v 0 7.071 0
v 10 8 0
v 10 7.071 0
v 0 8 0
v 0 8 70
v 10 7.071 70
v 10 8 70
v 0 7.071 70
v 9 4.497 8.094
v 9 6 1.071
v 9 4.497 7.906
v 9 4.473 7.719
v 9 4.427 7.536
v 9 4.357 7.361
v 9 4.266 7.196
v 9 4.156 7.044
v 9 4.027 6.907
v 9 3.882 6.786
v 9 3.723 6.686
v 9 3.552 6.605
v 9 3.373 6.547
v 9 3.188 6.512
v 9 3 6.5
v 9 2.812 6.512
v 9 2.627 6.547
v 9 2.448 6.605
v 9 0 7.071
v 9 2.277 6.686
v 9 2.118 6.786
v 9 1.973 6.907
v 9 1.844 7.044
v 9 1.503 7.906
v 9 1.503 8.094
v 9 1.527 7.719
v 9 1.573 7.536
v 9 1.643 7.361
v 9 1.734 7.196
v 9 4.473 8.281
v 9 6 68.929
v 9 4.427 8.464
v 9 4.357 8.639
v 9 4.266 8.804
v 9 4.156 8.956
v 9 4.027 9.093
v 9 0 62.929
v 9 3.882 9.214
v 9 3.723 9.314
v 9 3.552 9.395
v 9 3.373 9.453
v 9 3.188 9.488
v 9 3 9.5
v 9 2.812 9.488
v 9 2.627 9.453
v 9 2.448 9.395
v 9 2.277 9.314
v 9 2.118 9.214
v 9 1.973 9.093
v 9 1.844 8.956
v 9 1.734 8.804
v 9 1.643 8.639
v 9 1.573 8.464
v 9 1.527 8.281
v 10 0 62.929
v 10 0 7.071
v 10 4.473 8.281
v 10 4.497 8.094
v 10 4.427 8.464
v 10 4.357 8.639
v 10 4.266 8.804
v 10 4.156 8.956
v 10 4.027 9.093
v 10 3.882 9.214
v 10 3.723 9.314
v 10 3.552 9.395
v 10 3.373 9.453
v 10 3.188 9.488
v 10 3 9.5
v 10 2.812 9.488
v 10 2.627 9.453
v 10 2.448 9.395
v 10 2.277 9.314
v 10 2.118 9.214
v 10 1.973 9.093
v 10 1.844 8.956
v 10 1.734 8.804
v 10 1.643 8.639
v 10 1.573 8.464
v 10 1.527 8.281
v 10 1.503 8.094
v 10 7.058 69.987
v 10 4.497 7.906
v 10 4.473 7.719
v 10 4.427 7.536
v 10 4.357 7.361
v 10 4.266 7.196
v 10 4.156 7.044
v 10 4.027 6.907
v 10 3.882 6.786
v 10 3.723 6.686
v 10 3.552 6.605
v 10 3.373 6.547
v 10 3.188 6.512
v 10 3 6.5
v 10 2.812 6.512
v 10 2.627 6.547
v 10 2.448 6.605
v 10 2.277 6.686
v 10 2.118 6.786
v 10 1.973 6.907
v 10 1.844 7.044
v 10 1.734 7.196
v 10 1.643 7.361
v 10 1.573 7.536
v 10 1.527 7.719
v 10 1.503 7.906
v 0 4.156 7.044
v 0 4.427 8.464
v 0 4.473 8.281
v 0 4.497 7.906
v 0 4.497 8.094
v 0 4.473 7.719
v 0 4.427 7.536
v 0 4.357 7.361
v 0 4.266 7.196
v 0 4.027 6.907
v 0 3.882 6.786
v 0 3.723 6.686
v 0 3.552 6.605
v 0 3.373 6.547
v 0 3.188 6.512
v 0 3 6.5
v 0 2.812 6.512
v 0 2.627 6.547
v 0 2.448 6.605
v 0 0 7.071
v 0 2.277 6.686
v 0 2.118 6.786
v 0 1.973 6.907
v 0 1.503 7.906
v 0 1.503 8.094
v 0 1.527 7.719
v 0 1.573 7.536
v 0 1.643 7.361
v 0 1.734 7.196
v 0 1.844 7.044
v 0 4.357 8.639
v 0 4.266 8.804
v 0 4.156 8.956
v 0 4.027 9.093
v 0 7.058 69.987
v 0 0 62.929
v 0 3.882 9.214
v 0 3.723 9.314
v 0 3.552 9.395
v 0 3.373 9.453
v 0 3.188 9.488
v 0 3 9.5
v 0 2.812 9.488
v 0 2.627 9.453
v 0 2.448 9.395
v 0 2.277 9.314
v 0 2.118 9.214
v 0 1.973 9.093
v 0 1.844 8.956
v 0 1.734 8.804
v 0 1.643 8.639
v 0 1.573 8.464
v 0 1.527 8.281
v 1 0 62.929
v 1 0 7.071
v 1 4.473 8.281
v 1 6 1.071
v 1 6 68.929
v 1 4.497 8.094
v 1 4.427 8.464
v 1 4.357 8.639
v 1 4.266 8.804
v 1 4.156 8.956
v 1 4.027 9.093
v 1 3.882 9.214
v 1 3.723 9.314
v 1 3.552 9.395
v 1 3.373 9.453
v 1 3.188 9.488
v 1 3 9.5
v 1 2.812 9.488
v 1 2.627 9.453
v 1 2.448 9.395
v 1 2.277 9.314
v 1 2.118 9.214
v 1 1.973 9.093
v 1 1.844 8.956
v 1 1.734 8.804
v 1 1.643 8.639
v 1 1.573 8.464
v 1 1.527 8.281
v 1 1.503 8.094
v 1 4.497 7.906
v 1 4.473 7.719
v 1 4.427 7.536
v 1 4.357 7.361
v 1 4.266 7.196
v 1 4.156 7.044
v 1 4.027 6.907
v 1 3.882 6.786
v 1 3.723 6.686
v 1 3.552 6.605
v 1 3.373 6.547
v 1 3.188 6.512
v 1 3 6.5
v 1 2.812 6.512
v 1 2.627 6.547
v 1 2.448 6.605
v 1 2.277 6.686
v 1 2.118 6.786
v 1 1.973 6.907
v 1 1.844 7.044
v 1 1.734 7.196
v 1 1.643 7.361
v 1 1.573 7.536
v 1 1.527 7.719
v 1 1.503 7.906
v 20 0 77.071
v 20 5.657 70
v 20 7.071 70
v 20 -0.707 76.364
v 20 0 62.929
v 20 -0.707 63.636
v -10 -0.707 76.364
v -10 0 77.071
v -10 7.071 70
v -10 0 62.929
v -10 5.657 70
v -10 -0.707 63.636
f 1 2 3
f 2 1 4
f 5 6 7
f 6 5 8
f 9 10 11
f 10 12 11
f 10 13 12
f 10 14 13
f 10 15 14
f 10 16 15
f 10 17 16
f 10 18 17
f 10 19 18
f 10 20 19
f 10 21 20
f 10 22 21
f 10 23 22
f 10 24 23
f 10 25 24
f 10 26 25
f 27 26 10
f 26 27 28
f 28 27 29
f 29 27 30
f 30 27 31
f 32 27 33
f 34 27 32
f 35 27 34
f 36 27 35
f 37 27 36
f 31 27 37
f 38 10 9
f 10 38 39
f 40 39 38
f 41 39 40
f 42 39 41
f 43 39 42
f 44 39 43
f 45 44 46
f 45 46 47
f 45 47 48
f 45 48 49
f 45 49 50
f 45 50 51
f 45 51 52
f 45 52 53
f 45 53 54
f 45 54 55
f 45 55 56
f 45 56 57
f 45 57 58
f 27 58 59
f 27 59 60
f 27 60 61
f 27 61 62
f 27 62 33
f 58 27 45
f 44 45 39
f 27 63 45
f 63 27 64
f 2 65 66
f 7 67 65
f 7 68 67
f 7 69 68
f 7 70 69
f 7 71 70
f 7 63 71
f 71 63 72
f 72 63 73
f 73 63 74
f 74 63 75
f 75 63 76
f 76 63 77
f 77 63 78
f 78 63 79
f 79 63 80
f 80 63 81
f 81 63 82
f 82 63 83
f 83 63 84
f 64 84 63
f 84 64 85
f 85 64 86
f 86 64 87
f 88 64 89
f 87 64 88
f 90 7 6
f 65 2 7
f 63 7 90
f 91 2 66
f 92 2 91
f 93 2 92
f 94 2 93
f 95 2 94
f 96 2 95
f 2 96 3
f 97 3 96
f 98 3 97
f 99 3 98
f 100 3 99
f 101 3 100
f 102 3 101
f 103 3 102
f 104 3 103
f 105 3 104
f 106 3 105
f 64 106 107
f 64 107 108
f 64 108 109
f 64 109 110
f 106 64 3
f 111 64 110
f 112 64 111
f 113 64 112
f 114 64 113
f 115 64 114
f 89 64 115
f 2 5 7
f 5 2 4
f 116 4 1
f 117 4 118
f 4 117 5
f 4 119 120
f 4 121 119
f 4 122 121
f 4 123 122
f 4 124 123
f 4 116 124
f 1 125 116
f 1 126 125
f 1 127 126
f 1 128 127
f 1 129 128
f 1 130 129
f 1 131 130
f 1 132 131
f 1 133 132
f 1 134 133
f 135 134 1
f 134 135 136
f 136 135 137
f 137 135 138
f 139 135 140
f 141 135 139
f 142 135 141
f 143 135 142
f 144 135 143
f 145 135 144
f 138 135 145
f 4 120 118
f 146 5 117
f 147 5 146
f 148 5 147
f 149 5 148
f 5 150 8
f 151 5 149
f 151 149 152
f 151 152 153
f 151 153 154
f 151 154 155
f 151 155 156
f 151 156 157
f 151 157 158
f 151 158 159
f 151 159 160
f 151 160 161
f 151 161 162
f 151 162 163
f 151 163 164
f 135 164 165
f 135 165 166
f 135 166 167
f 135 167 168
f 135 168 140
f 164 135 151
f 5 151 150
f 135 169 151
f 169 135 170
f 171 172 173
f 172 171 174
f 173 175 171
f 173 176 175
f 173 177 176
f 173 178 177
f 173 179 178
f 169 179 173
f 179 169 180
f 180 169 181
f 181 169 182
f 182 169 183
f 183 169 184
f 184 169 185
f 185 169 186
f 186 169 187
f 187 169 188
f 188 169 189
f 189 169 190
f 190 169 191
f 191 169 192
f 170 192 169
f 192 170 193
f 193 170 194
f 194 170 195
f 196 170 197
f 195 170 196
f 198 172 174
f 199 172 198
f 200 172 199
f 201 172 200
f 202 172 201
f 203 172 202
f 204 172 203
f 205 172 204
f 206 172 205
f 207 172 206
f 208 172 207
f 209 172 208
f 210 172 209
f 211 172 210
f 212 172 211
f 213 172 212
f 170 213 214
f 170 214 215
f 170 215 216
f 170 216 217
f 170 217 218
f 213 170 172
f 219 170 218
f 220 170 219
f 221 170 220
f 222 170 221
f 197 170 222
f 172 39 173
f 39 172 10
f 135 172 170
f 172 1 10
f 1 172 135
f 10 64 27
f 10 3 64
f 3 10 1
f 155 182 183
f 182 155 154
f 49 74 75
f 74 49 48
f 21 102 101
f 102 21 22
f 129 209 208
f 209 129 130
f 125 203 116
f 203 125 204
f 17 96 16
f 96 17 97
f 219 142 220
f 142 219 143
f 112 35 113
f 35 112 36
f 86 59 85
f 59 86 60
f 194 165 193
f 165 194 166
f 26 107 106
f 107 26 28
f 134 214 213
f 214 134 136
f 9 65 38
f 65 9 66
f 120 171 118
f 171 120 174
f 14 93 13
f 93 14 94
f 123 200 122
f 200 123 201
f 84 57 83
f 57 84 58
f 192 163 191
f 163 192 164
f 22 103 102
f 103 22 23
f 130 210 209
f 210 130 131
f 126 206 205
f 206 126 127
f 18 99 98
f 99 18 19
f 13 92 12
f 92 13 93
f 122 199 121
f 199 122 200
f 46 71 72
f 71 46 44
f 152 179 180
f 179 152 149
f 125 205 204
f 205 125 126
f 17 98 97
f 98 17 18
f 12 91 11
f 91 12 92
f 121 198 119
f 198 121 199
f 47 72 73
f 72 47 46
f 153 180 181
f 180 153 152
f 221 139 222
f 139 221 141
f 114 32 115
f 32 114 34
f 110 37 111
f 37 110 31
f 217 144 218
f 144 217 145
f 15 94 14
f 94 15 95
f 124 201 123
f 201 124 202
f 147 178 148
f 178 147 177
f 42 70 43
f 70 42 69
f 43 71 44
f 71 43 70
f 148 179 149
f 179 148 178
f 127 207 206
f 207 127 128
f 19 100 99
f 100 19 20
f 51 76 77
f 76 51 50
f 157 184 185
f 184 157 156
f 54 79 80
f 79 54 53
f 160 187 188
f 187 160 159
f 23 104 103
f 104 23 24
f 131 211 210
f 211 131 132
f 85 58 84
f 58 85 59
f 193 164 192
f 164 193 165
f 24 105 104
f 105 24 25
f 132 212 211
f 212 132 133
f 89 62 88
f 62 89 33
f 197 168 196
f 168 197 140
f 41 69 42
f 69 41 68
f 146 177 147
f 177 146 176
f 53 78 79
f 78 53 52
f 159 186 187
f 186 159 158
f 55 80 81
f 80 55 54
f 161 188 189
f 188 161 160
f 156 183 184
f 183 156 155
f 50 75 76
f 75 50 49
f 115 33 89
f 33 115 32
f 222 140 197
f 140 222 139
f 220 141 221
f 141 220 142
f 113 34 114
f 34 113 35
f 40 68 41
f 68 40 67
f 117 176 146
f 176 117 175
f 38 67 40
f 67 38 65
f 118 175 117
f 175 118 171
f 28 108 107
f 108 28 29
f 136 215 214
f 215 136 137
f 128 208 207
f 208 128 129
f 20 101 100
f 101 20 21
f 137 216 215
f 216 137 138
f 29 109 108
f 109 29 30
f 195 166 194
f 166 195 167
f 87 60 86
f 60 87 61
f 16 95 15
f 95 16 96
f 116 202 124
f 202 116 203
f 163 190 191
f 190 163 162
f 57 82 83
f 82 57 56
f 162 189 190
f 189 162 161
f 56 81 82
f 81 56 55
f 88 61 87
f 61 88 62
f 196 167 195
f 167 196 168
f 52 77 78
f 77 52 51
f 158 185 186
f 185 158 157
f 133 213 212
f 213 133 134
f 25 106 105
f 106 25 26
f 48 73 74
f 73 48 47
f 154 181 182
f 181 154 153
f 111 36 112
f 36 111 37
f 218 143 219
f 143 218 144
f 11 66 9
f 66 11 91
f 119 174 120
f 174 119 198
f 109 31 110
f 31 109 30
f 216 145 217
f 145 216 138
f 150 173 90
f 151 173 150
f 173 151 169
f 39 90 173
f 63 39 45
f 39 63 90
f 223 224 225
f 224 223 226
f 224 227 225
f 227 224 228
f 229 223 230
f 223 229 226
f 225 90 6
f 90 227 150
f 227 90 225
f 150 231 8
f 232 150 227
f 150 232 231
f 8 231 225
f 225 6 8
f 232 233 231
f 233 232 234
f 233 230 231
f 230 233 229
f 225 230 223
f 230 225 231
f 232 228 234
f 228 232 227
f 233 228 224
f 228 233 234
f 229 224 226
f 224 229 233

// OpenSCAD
$fn=50;
module oneside(arm) {
    union() {
        {
            difference() {
                linear_extrude(height = arm) {
                    difference() {
                        square(size=[10,8]);
                        translate([1,0,0])
                        square(size=[8,6]);
                    }
                }
                translate([0,0,-5*sqrt(2)])
                rotate([45,0,0])
                cube(10);
                translate([0,3,8])
                rotate([0,90,0])
                cylinder(10,1.5,1.5,false);
                translate([0,0,arm-5*sqrt(2)])
                rotate([45,0,0])
                cube(10);
            }
        }

        translate([-10,0,arm-5*sqrt(2)])
        rotate([45,0,0])
        difference() {
            cube([30,10,10]);
            translate([0,0,1])
            cube([30,9,9]);
        }
    }
}

color("SteelBlue")
    oneside(70);
//rotate([7,0,0])
//translate([1.2,6,0])
//mirror([0,1,0])
//oneside(70);
